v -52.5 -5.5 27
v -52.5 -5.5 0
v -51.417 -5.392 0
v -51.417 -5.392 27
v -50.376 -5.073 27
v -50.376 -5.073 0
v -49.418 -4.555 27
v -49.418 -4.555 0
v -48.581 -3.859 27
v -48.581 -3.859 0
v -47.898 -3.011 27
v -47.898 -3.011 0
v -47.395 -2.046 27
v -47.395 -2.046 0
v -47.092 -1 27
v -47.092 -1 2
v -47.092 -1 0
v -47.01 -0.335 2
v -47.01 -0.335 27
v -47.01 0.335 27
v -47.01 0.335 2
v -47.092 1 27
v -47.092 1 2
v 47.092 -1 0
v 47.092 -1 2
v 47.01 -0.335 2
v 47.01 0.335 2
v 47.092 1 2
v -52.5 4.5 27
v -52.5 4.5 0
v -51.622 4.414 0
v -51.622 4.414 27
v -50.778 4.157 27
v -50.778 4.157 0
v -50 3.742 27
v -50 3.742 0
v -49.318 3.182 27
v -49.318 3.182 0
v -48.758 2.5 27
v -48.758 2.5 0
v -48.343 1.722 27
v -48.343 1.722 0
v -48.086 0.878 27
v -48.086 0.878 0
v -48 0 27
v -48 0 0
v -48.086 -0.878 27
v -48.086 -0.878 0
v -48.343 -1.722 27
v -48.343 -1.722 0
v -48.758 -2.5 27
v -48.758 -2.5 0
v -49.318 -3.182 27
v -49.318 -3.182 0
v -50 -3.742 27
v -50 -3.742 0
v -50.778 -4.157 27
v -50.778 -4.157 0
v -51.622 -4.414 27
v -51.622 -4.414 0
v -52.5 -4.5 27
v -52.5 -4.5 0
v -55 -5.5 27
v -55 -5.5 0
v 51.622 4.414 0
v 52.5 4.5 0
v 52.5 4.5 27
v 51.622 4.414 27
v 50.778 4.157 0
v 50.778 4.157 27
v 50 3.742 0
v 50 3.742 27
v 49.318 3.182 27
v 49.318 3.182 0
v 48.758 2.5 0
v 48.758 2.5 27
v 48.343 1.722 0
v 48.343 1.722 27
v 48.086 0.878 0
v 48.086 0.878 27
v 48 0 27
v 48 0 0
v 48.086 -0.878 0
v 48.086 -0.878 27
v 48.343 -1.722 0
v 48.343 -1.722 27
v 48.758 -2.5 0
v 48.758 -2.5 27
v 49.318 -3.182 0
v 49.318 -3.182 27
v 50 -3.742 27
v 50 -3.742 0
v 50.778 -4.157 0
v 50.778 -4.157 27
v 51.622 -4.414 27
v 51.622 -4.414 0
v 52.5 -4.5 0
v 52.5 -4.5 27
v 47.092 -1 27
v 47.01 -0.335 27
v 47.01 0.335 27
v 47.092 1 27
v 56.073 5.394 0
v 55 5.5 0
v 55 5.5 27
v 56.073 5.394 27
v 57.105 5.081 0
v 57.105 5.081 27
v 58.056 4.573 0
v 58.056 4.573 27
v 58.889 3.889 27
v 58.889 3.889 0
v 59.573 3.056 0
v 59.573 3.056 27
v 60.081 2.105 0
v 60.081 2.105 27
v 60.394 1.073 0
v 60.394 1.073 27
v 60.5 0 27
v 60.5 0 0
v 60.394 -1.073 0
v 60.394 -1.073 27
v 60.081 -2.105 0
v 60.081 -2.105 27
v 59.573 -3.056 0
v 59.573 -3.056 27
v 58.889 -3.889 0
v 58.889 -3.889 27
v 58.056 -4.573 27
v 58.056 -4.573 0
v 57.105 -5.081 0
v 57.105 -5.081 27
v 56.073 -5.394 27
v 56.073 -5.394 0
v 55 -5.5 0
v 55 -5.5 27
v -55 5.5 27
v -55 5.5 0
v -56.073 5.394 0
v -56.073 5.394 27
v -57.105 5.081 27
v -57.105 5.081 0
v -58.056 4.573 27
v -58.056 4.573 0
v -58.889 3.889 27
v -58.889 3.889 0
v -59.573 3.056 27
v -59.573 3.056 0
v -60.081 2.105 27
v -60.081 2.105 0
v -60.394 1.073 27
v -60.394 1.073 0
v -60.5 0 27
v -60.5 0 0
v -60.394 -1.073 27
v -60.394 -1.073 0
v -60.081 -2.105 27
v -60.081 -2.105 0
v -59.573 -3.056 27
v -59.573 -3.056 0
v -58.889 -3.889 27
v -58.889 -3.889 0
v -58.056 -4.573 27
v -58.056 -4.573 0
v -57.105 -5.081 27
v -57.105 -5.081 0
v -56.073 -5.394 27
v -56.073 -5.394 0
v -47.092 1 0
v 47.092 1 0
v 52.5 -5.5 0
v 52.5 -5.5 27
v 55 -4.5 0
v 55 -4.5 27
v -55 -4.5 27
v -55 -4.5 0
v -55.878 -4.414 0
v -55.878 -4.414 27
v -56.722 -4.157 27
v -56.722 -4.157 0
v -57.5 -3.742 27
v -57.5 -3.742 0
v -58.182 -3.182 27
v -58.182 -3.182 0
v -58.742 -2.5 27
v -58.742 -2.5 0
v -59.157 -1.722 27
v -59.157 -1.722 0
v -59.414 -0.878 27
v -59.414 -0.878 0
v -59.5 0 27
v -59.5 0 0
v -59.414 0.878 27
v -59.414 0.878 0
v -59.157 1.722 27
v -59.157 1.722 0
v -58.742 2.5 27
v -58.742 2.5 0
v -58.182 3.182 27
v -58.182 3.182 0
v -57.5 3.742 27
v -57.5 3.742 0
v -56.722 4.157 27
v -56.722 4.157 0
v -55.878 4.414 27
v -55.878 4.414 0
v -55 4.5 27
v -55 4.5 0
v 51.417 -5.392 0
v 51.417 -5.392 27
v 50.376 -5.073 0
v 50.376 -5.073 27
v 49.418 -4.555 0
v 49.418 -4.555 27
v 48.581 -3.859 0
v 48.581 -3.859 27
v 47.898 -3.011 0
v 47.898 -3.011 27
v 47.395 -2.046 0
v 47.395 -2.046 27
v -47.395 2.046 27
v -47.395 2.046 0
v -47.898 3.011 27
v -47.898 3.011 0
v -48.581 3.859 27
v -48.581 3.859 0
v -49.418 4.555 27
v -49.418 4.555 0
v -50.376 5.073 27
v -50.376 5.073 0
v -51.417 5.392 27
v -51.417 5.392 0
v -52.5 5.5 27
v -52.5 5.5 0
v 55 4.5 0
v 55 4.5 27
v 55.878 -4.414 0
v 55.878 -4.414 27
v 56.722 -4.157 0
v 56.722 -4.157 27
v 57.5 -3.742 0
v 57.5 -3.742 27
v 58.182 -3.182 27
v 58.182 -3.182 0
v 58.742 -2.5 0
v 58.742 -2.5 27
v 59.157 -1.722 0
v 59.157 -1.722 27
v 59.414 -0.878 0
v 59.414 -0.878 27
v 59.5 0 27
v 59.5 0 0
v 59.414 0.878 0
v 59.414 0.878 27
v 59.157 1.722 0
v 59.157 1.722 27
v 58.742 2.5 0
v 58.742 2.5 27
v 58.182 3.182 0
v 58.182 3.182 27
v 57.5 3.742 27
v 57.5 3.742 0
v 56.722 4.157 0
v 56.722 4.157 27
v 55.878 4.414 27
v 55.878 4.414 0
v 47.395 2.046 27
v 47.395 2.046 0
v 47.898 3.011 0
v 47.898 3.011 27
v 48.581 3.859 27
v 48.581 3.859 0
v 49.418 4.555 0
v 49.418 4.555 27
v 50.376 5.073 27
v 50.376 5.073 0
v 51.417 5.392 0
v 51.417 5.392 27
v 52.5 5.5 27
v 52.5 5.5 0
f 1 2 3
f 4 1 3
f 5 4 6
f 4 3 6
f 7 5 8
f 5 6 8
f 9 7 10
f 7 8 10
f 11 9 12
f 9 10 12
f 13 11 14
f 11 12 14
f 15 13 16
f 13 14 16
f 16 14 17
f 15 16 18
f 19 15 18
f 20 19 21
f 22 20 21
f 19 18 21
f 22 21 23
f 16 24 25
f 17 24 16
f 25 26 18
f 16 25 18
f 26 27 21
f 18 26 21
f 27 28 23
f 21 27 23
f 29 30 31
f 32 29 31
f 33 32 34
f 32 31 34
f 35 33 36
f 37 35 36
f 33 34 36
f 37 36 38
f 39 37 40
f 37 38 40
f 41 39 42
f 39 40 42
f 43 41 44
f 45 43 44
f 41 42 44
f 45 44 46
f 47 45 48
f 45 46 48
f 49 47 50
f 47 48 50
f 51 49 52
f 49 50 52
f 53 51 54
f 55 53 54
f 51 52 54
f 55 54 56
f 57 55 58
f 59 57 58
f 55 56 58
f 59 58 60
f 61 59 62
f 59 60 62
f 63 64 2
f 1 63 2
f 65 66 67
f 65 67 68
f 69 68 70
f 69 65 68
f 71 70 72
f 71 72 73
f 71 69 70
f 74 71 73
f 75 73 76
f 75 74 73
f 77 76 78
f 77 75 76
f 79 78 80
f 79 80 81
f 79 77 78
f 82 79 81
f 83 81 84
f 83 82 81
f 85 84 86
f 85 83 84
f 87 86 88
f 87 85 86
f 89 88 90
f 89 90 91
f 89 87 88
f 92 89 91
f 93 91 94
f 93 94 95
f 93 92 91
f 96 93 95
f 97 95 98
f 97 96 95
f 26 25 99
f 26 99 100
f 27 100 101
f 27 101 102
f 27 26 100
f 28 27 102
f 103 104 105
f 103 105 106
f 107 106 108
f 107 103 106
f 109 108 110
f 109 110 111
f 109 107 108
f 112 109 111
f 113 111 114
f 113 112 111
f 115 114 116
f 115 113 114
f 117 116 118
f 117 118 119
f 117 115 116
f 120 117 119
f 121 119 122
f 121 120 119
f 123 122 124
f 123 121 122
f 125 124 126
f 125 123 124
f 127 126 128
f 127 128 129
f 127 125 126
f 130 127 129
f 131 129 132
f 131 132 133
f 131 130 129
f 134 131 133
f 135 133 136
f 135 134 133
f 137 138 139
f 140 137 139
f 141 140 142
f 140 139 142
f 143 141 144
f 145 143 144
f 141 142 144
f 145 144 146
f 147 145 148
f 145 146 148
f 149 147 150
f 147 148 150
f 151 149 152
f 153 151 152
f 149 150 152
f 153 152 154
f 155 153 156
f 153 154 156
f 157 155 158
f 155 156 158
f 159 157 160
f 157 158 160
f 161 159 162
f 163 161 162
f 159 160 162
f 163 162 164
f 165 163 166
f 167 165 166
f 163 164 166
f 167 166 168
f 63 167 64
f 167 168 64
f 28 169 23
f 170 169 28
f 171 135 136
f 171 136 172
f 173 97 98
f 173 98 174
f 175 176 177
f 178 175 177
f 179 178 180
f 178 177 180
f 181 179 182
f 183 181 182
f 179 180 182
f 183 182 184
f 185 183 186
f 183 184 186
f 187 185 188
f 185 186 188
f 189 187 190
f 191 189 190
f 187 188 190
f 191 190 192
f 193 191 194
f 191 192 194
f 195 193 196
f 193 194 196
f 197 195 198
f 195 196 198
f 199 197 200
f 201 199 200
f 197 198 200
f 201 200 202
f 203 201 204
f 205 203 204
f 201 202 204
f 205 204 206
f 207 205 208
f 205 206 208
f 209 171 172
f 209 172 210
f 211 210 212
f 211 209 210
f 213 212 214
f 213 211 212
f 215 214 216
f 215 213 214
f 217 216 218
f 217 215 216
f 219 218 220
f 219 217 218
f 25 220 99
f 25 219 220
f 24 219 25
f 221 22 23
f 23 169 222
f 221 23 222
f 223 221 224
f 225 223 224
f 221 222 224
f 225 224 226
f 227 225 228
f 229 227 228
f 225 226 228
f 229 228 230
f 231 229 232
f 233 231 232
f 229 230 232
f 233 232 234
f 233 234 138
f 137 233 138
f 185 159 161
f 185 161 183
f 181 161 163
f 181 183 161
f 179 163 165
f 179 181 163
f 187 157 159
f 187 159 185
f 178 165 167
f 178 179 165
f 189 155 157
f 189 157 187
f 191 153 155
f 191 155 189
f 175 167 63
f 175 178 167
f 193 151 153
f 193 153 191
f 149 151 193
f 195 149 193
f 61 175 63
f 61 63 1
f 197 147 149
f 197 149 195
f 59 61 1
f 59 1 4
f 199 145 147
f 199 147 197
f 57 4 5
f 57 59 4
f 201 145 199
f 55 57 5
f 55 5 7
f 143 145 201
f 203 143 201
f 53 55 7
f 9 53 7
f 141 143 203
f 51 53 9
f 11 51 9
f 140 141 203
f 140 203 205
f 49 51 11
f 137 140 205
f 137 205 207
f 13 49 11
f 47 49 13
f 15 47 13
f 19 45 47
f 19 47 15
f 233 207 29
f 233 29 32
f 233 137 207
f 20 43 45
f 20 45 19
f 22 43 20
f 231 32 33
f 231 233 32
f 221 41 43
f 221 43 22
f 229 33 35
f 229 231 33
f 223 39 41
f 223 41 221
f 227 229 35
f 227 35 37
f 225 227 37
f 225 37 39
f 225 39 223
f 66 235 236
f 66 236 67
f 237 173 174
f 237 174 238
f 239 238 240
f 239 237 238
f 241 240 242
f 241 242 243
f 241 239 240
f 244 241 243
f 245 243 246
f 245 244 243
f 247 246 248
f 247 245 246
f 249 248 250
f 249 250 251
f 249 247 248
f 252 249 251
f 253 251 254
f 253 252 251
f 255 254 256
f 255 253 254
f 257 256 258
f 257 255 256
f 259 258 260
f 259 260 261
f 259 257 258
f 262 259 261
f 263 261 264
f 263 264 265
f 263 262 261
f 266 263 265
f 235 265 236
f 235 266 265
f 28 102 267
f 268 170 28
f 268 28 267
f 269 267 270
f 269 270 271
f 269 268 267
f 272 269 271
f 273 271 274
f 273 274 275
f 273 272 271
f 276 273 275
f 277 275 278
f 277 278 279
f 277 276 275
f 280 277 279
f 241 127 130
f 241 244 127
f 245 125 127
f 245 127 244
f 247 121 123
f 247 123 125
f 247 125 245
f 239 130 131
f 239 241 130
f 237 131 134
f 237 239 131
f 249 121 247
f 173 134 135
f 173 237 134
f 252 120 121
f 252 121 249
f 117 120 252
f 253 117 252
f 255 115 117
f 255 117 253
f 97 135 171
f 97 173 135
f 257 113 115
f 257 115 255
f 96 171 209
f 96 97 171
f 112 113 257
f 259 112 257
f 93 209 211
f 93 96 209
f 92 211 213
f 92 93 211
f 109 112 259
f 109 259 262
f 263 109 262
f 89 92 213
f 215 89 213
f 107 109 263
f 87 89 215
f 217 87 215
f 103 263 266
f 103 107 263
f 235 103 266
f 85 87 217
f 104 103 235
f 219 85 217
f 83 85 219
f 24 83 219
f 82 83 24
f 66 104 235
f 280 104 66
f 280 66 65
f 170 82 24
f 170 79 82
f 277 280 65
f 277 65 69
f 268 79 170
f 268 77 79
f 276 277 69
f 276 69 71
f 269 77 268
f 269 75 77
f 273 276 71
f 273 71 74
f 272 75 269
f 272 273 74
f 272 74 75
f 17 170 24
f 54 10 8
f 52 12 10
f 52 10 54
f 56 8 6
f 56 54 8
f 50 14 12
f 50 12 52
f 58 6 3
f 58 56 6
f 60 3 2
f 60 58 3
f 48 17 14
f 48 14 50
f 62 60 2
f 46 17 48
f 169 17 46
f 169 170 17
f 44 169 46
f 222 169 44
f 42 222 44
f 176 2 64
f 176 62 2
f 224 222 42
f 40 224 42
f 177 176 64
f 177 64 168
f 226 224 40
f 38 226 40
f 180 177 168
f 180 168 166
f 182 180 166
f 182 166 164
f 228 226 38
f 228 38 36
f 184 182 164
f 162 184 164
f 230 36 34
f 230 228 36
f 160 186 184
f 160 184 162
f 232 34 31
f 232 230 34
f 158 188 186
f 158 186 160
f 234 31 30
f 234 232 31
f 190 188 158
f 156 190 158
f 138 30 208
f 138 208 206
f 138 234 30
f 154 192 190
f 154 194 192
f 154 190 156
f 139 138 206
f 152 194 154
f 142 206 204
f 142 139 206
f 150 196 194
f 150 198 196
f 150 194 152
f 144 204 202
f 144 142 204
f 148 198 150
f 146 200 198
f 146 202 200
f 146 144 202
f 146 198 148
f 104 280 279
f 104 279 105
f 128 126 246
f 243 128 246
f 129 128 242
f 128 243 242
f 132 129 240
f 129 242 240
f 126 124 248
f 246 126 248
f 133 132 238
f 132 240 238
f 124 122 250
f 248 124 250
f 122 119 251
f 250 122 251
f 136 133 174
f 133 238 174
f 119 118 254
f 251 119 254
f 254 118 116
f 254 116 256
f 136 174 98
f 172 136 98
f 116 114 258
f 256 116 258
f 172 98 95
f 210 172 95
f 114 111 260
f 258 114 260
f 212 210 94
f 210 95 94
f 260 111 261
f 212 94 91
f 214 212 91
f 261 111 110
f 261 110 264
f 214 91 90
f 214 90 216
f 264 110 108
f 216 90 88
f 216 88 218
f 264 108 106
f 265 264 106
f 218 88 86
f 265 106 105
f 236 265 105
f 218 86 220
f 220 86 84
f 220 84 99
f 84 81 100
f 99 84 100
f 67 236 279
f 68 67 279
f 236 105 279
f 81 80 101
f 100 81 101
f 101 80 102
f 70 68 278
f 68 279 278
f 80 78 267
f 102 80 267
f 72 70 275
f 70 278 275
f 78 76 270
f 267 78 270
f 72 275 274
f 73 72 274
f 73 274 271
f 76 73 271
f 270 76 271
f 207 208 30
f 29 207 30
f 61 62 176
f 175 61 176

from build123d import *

# Parameters (mm, degrees)
F1_DEPTH = 27
F2_DEPTH = 2


with BuildPart() as f1:
    # F0 (on Top) → F1 (new body)
    with BuildSketch(Plane.XY):
        with BuildLine():
            Line((-52.5, 5.5), (-55, 5.5))
            ThreePointArc((-55, 5.5), (-60.5, 0), (-55, -5.5))
            Line((-55, -5.5), (-52.5, -5.5))
            ThreePointArc((-52.5, -5.5), (-48.982188, -4.227884), (-47.091673, -1))
            ThreePointArc((-47.091673, -1), (-47, 0), (-47.091673, 1))
            ThreePointArc((-47.091673, 1), (-48.982188, 4.227884), (-52.5, 5.5))
        make_face()
        with BuildLine():
            ThreePointArc((-52.5, 4.5), (-48, 0), (-52.5, -4.5))
            Line((-52.5, -4.5), (-55, -4.5))
            ThreePointArc((-55, -4.5), (-59.5, 0), (-55, 4.5))
            Line((-55, 4.5), (-52.5, 4.5))
        make_face(mode=Mode.SUBTRACT)
    extrude(amount=F1_DEPTH)

    # F0 (on Top) → F2 (join)
    with BuildSketch(Plane.XY):
        with BuildLine():
            Line((0, 1), (-47.091673, 1))
            ThreePointArc((-47.091673, 1), (-47, 0), (-47.091673, -1))
            Line((-47.091673, -1), (0, -1))
            Line((0, -1), (0, 1))
        make_face()
    extrude(amount=F2_DEPTH)

    # F3: F1 across plane


with BuildPart() as f1_1:
    add(f1.part)
    add(f1.part.mirror(Plane.YZ))


solid = f1_1.part
